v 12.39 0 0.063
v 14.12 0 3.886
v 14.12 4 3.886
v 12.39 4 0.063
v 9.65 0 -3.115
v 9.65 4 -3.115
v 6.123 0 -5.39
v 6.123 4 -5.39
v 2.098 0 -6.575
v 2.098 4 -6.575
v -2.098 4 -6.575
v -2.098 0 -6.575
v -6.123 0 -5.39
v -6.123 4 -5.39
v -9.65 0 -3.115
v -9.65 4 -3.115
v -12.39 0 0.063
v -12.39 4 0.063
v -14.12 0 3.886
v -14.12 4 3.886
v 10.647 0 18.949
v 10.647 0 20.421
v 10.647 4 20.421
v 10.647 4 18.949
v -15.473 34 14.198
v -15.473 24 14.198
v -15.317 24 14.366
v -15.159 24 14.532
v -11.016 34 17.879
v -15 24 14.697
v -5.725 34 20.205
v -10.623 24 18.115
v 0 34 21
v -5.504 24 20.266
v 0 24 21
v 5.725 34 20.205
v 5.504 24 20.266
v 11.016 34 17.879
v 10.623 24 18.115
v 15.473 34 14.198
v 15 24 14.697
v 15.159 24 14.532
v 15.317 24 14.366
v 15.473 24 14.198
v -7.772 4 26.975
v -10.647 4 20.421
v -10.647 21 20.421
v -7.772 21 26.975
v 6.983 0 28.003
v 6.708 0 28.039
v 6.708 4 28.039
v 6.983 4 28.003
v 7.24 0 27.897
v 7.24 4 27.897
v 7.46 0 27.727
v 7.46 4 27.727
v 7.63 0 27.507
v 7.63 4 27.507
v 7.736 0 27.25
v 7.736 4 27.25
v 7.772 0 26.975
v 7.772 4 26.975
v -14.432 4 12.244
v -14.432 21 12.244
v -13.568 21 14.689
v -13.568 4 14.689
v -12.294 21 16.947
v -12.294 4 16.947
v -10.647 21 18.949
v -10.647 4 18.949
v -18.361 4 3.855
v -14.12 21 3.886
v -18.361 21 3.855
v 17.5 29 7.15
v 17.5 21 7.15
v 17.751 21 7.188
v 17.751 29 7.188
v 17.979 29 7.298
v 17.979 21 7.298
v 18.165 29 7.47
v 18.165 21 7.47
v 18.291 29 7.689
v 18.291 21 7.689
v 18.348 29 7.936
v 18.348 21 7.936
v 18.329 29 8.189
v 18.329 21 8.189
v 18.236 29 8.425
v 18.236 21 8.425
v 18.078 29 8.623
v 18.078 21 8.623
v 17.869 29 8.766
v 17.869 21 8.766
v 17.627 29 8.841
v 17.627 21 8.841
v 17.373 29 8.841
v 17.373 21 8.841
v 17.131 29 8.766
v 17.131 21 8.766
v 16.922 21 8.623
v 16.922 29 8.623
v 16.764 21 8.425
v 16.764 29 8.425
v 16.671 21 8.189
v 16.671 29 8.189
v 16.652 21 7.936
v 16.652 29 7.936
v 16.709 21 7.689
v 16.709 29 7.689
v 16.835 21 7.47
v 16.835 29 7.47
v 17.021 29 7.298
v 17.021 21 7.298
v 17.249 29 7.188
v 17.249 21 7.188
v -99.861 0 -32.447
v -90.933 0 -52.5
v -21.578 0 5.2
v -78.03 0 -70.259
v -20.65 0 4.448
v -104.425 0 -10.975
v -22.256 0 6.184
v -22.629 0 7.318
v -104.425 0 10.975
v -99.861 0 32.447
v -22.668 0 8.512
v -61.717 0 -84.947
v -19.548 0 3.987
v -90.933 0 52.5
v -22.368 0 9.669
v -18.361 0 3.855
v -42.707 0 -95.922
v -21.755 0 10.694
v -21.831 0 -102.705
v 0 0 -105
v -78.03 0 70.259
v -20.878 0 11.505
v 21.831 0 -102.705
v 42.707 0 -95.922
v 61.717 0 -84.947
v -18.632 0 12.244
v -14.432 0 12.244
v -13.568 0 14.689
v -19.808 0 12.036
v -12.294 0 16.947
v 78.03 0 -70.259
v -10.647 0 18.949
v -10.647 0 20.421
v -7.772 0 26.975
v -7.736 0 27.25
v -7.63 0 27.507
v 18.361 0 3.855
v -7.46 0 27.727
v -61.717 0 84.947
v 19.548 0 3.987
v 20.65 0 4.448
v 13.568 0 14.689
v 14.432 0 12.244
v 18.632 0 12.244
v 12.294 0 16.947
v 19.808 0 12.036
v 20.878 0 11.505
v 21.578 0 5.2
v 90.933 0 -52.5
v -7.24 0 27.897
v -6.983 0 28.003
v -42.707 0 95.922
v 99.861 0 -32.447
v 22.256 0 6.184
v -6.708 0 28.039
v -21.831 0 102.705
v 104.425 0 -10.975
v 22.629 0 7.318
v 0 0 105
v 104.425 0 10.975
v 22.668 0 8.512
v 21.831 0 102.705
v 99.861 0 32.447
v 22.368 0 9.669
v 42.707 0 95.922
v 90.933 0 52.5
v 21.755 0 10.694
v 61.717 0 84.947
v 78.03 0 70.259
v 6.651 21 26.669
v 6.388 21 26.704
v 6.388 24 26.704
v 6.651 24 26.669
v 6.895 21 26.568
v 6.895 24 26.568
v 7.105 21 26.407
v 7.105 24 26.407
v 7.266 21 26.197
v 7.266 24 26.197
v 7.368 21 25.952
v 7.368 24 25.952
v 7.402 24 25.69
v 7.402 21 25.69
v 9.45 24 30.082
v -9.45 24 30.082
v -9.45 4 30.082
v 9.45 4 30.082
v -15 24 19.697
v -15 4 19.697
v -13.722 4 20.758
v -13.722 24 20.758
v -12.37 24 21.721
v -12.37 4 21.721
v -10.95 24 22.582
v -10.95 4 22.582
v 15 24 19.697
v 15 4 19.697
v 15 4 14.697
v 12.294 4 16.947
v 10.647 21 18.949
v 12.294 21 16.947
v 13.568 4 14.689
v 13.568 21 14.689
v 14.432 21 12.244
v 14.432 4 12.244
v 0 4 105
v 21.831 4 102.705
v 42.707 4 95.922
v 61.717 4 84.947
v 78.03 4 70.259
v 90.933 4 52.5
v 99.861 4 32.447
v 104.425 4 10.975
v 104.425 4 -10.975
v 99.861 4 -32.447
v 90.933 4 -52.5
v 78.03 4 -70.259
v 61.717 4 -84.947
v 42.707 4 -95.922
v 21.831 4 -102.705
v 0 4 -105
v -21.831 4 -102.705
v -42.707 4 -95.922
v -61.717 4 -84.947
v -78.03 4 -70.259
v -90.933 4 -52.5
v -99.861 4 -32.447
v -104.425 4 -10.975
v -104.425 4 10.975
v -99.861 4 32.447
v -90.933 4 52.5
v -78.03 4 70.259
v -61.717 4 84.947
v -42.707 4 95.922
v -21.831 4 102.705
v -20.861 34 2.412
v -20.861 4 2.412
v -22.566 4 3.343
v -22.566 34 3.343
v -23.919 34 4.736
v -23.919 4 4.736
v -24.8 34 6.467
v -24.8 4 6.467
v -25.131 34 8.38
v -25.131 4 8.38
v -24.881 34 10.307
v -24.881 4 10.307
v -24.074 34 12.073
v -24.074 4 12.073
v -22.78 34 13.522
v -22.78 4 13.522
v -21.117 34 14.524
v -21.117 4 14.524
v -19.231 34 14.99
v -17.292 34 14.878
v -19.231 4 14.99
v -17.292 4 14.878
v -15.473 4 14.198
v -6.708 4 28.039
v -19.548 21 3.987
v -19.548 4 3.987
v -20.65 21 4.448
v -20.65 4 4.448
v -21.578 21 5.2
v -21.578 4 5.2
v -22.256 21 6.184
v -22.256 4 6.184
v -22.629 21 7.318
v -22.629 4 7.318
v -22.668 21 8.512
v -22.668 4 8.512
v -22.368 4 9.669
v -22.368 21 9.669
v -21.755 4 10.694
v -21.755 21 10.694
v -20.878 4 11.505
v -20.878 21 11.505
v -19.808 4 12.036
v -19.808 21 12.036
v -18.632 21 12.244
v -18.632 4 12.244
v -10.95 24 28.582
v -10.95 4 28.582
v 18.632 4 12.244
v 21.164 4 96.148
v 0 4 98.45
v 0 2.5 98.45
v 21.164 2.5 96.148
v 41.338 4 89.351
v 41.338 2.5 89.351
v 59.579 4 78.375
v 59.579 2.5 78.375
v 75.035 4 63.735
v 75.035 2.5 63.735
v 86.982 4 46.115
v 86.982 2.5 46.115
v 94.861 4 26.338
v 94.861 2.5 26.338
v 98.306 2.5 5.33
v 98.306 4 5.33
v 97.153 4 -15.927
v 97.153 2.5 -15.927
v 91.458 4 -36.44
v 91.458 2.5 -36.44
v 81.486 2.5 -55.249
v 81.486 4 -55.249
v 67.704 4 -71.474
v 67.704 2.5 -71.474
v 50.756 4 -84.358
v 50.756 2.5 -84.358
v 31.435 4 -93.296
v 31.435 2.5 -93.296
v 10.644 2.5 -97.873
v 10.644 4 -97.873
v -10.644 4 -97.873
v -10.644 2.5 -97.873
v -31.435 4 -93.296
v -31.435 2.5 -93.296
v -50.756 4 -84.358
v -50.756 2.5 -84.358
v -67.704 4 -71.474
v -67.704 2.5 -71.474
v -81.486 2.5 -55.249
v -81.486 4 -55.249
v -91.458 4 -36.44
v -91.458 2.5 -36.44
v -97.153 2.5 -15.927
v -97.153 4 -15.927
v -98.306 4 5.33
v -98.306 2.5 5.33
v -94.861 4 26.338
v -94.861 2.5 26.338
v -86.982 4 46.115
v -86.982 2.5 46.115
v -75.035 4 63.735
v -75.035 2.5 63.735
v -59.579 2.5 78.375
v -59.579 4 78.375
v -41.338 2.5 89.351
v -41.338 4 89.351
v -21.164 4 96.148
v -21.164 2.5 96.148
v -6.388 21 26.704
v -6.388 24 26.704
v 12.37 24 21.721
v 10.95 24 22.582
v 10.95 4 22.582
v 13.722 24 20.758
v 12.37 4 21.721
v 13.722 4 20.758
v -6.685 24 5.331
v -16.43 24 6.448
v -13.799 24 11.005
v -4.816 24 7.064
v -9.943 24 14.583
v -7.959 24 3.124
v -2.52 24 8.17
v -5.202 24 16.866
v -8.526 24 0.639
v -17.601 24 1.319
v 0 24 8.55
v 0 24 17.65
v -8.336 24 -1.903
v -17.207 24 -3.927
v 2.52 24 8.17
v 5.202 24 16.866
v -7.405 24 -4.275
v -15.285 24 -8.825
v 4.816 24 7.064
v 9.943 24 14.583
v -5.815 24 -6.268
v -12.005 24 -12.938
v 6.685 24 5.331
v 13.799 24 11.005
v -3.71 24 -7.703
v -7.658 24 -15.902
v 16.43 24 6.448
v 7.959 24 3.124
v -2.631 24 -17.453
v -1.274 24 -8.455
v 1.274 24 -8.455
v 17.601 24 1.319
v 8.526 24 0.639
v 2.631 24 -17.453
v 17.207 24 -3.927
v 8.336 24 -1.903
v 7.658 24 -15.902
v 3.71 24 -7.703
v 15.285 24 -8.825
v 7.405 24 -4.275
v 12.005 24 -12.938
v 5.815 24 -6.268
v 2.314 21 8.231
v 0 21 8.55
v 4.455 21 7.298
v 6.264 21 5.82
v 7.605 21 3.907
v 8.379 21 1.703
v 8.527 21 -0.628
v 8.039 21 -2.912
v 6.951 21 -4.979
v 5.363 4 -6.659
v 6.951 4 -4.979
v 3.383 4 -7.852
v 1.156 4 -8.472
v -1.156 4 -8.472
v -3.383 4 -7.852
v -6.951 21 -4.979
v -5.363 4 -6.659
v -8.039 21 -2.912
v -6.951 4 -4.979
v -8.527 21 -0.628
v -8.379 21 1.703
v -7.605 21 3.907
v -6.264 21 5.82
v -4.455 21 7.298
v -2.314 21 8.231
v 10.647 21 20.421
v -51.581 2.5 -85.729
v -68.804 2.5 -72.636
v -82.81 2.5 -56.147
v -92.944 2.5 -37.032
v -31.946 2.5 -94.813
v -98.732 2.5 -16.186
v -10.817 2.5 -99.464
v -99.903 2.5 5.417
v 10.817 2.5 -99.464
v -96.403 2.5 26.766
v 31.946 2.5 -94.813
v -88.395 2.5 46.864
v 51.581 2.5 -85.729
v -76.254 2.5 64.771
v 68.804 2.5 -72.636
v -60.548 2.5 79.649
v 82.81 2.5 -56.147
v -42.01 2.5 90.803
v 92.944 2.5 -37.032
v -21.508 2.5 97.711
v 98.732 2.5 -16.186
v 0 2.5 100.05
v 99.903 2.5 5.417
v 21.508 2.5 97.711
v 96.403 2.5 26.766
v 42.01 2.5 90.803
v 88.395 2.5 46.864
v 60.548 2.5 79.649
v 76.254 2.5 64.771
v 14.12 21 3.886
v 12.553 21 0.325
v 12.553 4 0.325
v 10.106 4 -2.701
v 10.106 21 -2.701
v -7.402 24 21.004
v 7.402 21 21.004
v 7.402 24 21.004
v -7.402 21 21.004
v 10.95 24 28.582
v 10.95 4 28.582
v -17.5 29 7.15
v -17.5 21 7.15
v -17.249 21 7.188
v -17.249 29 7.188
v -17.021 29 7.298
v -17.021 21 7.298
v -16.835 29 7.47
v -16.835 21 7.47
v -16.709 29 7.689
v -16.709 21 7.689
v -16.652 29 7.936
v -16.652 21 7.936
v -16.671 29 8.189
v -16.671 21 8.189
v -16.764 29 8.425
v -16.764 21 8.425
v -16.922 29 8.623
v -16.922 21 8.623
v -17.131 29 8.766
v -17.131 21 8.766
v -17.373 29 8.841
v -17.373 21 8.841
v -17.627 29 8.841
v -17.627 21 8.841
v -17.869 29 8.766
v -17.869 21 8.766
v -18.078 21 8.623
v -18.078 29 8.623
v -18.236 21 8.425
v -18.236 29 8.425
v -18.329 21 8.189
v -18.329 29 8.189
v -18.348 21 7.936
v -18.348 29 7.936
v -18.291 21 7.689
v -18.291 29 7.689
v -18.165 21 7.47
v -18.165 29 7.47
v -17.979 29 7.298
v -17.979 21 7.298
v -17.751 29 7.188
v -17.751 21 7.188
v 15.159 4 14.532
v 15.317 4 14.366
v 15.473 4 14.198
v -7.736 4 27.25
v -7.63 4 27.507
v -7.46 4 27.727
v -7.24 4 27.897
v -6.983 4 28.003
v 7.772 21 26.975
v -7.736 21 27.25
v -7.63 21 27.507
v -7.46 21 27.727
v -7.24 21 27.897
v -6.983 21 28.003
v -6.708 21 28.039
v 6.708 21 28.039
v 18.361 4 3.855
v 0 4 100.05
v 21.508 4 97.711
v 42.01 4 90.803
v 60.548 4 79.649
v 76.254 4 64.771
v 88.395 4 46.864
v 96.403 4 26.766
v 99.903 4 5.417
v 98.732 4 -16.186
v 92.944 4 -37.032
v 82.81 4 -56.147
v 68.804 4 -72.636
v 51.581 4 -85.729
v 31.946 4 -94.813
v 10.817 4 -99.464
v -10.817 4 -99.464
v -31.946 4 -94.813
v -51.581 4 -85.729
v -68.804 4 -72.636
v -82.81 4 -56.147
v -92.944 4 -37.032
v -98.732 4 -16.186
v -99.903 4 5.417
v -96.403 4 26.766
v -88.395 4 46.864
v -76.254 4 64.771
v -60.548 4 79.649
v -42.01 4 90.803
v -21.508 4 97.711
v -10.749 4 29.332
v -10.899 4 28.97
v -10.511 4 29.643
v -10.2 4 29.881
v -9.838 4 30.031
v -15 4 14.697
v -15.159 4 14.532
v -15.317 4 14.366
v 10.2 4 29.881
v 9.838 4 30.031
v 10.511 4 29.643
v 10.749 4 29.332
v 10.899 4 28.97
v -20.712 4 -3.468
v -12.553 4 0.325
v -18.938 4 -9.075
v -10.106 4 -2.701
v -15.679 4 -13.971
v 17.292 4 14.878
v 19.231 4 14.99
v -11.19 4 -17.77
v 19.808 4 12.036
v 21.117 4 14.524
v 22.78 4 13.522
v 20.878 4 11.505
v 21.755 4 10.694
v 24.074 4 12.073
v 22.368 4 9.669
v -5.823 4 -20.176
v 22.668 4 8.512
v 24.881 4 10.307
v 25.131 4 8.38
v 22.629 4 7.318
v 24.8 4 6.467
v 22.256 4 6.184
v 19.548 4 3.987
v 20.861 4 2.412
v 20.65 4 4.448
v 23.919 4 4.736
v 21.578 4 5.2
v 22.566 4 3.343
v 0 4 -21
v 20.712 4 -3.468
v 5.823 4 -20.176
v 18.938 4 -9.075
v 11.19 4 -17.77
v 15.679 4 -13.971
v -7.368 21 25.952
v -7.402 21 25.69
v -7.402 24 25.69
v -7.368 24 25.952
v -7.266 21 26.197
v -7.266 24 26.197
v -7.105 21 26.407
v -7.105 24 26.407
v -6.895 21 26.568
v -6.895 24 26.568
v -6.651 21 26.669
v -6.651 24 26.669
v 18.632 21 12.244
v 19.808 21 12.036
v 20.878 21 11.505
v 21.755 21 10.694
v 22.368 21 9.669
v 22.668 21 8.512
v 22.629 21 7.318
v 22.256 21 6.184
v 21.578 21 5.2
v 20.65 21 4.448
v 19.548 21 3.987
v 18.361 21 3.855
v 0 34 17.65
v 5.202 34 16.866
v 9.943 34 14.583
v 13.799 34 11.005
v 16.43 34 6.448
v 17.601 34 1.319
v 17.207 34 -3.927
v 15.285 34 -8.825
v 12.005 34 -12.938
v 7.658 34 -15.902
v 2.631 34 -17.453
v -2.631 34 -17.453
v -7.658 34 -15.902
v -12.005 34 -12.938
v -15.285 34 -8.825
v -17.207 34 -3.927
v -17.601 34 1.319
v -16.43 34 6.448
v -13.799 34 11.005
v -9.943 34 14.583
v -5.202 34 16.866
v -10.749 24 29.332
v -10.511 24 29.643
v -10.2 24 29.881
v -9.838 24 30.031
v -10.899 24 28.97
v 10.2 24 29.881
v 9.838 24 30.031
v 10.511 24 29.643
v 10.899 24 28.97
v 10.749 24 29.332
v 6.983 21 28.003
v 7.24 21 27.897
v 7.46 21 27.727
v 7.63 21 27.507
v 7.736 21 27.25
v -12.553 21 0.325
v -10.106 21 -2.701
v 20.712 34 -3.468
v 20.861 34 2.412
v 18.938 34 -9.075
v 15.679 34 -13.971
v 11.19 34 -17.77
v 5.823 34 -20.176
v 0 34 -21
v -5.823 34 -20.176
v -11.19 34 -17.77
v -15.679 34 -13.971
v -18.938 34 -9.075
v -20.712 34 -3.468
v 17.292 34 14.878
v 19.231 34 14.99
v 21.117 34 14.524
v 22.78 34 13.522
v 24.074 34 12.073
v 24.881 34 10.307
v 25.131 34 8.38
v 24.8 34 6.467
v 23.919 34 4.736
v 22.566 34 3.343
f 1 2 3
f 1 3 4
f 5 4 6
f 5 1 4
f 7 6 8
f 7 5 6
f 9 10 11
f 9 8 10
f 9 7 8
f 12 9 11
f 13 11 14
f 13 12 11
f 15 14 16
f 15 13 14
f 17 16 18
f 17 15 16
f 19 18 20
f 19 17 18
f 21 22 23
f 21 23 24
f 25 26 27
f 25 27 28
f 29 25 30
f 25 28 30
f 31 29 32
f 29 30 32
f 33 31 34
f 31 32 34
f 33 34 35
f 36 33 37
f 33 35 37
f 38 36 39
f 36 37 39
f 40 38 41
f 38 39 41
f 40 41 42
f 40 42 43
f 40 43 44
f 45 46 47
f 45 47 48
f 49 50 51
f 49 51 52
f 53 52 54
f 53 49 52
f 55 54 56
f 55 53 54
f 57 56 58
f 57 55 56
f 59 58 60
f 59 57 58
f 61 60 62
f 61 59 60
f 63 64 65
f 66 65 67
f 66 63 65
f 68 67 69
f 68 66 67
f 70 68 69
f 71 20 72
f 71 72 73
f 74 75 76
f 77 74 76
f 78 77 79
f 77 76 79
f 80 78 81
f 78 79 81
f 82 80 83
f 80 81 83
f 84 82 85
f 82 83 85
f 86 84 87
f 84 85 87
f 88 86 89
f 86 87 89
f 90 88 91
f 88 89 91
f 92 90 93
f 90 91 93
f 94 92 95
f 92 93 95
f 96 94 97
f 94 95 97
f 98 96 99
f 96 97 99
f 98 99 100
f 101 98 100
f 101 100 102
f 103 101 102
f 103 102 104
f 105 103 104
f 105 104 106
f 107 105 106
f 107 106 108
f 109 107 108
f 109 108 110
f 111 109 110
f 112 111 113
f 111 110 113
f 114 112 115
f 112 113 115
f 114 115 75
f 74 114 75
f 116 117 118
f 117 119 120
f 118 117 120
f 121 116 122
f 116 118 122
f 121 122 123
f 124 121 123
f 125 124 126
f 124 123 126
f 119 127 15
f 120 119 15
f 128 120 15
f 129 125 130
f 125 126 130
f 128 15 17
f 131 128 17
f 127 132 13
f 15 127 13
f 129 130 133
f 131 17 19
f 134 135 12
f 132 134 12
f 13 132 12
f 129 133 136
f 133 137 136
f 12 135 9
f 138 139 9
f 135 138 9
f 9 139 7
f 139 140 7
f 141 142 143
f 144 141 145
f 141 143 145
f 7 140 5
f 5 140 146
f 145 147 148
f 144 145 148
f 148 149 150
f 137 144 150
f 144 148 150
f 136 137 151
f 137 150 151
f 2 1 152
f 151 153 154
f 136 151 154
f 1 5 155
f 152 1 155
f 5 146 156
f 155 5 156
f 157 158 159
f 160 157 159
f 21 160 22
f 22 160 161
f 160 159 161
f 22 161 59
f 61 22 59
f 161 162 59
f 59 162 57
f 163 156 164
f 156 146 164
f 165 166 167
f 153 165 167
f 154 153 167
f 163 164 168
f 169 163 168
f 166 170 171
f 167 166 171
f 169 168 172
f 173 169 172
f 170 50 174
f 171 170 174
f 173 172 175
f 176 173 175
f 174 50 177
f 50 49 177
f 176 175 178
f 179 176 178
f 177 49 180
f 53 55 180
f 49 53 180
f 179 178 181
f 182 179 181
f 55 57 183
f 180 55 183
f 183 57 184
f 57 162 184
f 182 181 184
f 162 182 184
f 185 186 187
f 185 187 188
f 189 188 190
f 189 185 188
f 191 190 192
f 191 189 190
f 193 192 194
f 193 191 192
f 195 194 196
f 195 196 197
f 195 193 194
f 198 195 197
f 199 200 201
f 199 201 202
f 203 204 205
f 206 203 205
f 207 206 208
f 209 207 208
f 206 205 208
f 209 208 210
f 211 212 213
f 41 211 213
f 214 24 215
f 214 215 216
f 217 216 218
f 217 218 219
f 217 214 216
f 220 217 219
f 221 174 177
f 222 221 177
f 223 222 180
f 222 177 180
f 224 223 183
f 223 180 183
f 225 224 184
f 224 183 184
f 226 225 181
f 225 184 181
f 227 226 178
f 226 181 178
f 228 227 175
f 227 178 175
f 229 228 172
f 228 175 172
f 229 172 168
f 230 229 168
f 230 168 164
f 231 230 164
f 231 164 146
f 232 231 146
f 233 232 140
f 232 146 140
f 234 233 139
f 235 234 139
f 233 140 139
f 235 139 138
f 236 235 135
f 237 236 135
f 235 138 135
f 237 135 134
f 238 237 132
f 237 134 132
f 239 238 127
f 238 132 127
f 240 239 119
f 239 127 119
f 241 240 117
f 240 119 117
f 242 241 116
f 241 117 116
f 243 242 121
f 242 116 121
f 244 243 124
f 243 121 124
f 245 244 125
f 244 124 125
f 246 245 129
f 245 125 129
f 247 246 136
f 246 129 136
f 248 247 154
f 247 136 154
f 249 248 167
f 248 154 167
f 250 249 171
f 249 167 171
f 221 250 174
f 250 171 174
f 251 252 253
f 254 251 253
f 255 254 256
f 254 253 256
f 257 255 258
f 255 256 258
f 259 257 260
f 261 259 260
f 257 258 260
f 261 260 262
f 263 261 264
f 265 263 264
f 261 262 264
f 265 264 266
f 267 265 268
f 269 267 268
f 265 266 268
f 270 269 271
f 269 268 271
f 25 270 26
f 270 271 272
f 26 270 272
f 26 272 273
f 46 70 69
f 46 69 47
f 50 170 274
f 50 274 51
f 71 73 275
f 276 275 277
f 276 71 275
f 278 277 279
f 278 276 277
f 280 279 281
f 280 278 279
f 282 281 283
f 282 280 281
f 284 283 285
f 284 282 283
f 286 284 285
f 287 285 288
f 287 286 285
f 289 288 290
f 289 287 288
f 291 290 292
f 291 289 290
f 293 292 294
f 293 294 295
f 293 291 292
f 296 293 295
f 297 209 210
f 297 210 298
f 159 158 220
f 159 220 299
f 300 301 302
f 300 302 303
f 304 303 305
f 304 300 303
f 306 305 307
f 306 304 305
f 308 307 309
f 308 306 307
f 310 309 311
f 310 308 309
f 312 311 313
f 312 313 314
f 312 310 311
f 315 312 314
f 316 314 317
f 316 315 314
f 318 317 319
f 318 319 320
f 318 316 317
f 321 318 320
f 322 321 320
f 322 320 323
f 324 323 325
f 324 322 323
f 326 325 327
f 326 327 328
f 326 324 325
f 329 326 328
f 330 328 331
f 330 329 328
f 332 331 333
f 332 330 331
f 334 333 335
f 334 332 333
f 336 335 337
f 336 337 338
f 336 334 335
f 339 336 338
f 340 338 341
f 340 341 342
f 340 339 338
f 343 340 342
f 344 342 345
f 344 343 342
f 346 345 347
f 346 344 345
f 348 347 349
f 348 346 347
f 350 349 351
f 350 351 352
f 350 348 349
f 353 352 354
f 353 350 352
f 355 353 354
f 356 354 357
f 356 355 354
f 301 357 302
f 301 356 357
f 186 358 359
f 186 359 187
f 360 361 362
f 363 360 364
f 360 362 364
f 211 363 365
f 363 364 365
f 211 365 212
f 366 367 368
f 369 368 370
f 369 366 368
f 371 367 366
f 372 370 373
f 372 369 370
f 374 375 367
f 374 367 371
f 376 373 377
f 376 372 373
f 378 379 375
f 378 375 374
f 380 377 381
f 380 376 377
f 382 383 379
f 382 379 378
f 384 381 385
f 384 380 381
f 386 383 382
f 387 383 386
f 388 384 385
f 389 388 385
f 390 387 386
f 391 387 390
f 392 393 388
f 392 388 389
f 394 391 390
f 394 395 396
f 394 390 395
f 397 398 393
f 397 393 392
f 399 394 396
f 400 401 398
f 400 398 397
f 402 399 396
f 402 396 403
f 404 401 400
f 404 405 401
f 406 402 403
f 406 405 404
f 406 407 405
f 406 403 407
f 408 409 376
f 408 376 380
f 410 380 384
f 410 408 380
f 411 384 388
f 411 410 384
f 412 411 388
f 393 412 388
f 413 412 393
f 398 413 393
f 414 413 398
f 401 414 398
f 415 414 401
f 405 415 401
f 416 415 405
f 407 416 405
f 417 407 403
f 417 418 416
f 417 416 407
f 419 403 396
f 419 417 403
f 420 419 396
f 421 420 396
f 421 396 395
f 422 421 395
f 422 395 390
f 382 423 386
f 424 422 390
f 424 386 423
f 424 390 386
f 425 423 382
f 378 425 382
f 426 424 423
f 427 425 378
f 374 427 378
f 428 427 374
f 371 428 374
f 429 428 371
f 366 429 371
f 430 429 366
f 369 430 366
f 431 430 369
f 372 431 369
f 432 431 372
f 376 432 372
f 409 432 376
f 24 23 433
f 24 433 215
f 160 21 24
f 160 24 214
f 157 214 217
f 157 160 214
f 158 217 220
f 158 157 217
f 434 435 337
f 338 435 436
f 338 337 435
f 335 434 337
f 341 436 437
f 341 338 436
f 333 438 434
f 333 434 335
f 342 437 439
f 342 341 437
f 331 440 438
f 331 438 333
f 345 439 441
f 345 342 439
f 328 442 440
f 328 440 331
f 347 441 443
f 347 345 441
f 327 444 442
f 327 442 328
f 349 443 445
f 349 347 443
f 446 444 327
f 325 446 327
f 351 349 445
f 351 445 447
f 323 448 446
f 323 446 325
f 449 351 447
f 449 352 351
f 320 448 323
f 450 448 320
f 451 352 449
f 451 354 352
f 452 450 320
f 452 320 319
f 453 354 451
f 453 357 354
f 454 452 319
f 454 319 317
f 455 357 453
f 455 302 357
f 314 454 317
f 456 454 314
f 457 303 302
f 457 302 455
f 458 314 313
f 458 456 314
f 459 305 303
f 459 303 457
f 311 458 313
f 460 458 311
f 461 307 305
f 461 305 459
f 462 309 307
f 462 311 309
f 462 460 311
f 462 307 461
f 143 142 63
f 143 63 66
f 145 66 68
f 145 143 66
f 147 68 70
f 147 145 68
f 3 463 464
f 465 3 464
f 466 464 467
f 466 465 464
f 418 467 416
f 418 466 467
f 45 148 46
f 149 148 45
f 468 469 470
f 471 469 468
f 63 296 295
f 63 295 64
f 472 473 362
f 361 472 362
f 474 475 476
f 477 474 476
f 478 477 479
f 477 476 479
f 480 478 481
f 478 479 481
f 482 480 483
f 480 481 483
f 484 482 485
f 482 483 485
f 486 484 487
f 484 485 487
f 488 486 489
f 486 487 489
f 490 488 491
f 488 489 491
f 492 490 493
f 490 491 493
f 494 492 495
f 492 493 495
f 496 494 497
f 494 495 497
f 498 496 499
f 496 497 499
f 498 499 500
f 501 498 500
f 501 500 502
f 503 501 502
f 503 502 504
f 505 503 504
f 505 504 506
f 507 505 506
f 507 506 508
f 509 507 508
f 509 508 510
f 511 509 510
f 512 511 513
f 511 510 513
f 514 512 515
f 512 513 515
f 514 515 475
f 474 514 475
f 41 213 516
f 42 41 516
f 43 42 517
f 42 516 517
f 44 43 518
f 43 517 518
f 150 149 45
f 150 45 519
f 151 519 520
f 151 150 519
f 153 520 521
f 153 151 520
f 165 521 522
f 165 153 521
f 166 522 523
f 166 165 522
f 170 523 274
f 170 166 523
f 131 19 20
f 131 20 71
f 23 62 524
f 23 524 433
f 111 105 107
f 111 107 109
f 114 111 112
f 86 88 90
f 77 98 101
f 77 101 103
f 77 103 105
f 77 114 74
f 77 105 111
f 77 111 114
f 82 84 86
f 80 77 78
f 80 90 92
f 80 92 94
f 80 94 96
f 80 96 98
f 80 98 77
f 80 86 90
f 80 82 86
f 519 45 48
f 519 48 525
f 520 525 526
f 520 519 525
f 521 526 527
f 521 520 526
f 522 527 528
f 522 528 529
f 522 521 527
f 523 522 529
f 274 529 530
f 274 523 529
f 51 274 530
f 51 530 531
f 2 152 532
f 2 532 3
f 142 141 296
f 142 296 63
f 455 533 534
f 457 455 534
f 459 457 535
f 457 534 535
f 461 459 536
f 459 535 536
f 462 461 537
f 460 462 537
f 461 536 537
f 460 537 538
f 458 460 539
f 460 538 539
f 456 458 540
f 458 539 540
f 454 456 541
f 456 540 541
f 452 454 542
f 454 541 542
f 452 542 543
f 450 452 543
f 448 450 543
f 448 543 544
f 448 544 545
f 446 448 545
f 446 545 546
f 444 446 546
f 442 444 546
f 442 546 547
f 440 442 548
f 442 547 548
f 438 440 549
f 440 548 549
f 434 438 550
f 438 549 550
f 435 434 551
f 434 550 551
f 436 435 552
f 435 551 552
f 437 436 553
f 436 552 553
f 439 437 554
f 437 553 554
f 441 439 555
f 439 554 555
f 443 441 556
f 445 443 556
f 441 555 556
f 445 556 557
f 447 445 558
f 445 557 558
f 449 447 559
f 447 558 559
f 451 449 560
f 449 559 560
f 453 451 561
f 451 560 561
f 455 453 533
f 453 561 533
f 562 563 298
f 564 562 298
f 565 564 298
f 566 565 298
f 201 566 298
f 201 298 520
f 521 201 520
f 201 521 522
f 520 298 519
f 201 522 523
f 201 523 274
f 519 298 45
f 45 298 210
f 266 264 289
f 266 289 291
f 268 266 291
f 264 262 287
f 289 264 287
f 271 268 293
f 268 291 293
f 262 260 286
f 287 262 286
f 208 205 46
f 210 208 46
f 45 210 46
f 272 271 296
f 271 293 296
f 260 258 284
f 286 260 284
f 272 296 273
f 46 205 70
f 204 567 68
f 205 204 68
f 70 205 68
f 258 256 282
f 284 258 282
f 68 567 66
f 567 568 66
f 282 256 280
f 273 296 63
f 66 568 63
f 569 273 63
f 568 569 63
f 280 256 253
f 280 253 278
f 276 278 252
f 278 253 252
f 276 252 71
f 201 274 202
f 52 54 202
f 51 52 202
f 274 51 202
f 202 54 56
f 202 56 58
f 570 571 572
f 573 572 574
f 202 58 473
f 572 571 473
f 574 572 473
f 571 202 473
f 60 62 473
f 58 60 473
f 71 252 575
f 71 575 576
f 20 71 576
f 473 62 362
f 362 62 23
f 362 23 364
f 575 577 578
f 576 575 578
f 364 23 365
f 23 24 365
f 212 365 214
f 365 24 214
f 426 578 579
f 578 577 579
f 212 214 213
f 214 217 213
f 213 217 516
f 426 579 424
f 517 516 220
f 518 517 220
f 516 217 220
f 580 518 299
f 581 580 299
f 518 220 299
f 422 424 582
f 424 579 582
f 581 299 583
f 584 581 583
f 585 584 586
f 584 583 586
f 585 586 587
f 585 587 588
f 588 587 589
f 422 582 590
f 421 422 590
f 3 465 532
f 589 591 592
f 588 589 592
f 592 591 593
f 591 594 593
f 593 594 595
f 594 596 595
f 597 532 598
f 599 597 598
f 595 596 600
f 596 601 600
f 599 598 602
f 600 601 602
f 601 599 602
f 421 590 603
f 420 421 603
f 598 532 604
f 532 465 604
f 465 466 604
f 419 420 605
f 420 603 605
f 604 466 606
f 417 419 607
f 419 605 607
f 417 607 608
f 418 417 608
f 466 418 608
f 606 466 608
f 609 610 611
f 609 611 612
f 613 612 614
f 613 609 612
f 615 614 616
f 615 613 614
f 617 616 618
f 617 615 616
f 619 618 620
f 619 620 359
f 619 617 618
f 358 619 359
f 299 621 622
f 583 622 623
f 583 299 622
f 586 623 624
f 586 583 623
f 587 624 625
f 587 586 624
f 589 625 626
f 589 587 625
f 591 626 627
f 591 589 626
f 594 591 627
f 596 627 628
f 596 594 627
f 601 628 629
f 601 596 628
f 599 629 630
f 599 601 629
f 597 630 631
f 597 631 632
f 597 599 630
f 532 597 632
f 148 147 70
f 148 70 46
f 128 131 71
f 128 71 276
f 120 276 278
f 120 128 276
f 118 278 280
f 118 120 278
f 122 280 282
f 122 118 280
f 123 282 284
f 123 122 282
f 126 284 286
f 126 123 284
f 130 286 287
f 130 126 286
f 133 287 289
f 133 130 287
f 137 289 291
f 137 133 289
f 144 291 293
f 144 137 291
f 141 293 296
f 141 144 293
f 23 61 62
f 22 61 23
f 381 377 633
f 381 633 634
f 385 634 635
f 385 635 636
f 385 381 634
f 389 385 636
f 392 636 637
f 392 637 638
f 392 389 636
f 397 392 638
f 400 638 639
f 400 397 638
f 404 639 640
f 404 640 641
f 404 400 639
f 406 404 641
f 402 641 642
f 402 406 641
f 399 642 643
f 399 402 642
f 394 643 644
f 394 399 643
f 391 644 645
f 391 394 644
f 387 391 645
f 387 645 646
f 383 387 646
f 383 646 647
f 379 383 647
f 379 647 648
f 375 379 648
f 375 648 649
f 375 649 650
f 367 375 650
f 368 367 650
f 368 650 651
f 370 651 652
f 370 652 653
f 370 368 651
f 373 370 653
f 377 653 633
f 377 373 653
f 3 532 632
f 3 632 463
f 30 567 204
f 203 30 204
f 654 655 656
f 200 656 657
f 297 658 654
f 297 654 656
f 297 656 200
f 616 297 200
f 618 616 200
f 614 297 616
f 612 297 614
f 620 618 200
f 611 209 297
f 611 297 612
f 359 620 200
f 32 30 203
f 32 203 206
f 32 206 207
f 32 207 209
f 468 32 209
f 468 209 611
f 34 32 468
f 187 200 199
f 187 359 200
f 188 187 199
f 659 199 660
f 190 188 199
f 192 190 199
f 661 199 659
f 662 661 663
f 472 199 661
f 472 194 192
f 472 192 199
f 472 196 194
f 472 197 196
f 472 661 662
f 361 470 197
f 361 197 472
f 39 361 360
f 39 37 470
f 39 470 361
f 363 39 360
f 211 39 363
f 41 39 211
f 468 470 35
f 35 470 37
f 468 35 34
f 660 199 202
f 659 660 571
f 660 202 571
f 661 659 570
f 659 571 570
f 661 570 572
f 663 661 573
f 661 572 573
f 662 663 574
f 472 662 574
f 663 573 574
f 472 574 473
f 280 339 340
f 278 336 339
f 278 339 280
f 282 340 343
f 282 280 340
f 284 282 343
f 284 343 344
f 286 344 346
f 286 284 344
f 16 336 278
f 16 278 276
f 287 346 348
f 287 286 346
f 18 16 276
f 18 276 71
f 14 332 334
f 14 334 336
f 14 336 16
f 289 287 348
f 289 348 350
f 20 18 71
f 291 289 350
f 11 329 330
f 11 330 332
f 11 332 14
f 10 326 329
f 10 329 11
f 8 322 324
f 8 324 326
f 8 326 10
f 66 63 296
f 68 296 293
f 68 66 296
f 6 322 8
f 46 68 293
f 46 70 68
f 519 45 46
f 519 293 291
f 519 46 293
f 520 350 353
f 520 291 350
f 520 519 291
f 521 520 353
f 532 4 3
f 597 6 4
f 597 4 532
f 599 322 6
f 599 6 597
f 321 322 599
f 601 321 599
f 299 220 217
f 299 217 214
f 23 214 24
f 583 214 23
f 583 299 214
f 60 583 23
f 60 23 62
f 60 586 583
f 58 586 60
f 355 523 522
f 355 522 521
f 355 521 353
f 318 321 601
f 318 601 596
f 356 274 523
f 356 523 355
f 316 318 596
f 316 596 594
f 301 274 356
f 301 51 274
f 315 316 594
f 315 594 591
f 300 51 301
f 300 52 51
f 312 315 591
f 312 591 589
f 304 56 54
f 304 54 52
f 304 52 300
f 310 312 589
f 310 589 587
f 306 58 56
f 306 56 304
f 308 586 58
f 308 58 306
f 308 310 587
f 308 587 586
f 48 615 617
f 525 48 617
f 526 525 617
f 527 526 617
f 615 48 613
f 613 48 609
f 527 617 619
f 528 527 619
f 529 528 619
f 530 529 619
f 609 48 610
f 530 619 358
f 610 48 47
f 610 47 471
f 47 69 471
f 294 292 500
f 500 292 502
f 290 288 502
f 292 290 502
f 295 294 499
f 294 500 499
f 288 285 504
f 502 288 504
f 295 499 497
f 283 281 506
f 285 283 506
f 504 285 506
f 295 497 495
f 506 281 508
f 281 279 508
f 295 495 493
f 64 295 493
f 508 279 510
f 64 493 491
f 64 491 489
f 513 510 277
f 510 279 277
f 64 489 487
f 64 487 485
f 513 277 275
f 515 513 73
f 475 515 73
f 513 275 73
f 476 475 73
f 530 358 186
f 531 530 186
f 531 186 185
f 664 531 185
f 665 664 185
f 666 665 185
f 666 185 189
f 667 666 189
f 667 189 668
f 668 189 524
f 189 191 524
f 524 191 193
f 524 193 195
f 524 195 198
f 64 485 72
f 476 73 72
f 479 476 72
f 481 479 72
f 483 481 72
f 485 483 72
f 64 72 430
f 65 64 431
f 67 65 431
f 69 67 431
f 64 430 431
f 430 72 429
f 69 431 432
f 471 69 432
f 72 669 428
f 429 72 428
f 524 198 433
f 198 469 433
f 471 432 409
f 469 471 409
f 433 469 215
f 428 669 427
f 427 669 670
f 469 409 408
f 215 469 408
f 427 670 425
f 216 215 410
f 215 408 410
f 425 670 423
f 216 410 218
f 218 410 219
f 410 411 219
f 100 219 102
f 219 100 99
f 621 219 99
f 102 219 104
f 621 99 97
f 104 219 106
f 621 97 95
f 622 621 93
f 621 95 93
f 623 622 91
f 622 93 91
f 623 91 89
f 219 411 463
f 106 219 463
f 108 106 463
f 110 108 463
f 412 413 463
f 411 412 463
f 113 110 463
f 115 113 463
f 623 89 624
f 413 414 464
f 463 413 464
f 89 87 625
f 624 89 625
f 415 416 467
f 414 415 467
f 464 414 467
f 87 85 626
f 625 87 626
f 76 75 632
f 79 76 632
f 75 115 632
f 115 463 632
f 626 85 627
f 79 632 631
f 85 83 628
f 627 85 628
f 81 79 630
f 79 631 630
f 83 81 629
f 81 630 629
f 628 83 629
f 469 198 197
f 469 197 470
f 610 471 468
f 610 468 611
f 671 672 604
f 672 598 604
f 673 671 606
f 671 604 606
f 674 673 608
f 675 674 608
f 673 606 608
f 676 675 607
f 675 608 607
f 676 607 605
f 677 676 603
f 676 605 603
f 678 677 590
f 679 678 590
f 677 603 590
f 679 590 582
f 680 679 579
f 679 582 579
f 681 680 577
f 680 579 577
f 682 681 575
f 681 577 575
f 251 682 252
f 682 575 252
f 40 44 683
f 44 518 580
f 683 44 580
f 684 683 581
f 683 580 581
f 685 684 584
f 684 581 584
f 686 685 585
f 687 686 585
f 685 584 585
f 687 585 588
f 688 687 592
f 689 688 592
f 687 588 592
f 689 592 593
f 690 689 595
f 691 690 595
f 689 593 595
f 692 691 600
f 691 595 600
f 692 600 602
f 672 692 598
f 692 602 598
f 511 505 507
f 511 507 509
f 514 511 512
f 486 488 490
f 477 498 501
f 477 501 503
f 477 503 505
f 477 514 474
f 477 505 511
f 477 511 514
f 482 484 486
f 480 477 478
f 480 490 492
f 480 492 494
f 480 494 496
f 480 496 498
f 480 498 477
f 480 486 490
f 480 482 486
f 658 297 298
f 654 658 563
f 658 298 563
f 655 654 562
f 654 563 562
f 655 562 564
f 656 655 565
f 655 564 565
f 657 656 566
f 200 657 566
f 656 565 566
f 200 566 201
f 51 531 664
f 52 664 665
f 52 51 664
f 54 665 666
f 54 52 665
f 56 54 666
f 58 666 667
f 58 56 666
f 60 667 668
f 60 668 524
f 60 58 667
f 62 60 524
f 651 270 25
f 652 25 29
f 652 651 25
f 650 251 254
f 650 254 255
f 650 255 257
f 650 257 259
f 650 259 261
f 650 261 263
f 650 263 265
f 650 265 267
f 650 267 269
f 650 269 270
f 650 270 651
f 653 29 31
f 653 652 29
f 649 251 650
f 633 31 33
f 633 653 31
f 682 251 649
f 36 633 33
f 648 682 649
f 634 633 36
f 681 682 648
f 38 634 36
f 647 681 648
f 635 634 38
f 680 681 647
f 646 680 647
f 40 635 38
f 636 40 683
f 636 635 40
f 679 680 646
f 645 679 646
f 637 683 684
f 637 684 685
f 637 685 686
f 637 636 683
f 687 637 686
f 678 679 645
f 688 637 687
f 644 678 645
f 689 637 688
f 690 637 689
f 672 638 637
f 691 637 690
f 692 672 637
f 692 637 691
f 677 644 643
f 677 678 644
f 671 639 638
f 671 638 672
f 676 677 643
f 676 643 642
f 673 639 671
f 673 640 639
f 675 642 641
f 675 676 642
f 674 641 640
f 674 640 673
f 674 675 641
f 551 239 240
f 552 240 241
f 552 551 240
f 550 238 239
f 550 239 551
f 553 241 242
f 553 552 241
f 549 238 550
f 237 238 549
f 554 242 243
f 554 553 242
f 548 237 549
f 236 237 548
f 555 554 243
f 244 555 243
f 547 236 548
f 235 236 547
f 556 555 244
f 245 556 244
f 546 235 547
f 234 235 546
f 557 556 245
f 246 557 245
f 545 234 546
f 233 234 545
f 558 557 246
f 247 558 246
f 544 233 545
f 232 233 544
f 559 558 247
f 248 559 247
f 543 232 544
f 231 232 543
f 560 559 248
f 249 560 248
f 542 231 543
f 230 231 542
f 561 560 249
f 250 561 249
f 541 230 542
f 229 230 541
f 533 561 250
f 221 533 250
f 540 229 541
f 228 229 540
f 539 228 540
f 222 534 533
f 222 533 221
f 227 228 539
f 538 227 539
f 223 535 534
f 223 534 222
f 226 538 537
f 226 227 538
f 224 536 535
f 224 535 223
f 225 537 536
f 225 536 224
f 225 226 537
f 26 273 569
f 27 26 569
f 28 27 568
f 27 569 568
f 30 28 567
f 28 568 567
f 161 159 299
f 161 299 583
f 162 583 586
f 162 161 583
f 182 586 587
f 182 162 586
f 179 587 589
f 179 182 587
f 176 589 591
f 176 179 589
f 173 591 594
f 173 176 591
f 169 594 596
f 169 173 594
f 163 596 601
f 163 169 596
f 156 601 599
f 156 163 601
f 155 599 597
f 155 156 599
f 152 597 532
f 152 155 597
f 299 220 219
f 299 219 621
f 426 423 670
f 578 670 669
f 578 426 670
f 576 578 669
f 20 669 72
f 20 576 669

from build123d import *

# Parameters (mm, degrees)
SKETCH1_R               = 105
BOSS_EXTRUDE1_DEPTH     = 4
SKETCH4_R               = 8.55
BOSS_EXTRUDE3_DEPTH     = 20
SKETCH5_R               = 17.65
BOSS_EXTRUDE4_DEPTH     = 10
CUT_EXTRUDE2_DEPTH      = 17
CUT_EXTRUDE2_DEPTH_BACK = 152.492574075
SKETCH14_R              = 100.05
SKETCH14_R_2            = 98.45
CUT_EXTRUDE3_DEPTH      = 1.5
SKETCH15_R              = 0.85
CUT_EXTRUDE4_DEPTH      = 8


with BuildPart() as part:
    # Sketch1 → Boss-Extrude1 (new body)
    with BuildSketch(Plane(origin=(0, 0, 0), x_dir=(1, 0, 0), z_dir=(0, 1, 0))):
        with Locations(Location((0, 0, 0), (0, 0, 270))):
            Circle(SKETCH1_R)
    extrude(amount=BOSS_EXTRUDE1_DEPTH)


with BuildPart() as body_2:
    # Sketch4 → Boss-Extrude3 (new body)
    with BuildSketch(Plane(origin=(0, 4, 0), x_dir=(1, 0, 0), z_dir=(0, 1, 0))):
        with BuildLine():
            Line((15, -19.696938457), (15, -14.696938457))
            ThreePointArc((15, -14.696938457), (15.238514929, -14.449486592), (15.472948223, -14.198164434))
            ThreePointArc((15.472948223, -14.198164434), (24.543834091, -11.220038442), (20.861060766, -2.411668247))
            ThreePointArc((20.861060766, -2.411668247), (0, 21), (-20.861060766, -2.411668247))
            ThreePointArc((-20.861060766, -2.411668247), (-24.543834091, -11.220038442), (-15.472948223, -14.198164434))
            ThreePointArc((-15.472948223, -14.198164434), (-15.238514929, -14.449486592), (-15, -14.696938457))
            Line((-15, -14.696938457), (-15, -19.696938457))
            ThreePointArc((-15, -19.696938457), (-13.054950812, -21.25177335), (-10.95, -22.582152982))
            Line((-10.95, -22.582152982), (-10.95, -28.582152982))
            ThreePointArc((-10.95, -28.582152982), (-10.510660172, -29.642813154), (-9.45, -30.082152982))
            Line((-9.45, -30.082152982), (9.45, -30.082152982))
            ThreePointArc((9.45, -30.082152982), (10.510660172, -29.642813154), (10.95, -28.582152982))
            Line((10.95, -28.582152982), (10.95, -22.582152982))
            ThreePointArc((10.95, -22.582152982), (13.054950812, -21.25177335), (15, -19.696938457))
        make_face()
        with Locations(Location((0, 0, 0), (0, 0, 270))):
            Circle(SKETCH4_R, mode=Mode.SUBTRACT)
        with BuildLine():
            Line((7.4022, -25.690036345), (7.4022, -21.004036345))
            Line((7.4022, -21.004036345), (-7.4022, -21.004036345))
            Line((-7.4022, -21.004036345), (-7.4022, -25.690036345))
            ThreePointArc((-7.4022, -25.690036345), (-7.105206276, -26.407042621), (-6.3882, -26.704036345))
            Line((-6.3882, -26.704036345), (6.3882, -26.704036345))
            ThreePointArc((6.3882, -26.704036345), (7.105206276, -26.407042621), (7.4022, -25.690036345))
        make_face(mode=Mode.SUBTRACT)
    extrude(amount=BOSS_EXTRUDE3_DEPTH)

    # Sketch5 → Boss-Extrude4 (add)
    with BuildSketch(Plane(origin=(0, 24, 0), x_dir=(1, 0, 0), z_dir=(0, 1, 0))):
        with BuildLine():
            ThreePointArc((-15.472948223, -14.198164434), (0, -21), (15.472948223, -14.198164434))
            ThreePointArc((15.472948223, -14.198164434), (24.543834091, -11.220038442), (20.861060766, -2.411668247))
            ThreePointArc((20.861060766, -2.411668247), (0, 21), (-20.861060766, -2.411668247))
            ThreePointArc((-20.861060766, -2.411668247), (-24.543834091, -11.220038442), (-15.472948223, -14.198164434))
        make_face()
        with Locations(Location((0, 0, 0), (0, 0, 270))):
            Circle(SKETCH5_R, mode=Mode.SUBTRACT)
    extrude(amount=BOSS_EXTRUDE4_DEPTH)


with BuildPart() as cut_extrude2_tool:
    # Sketch2 → Cut-Extrude2 (new, two sides: drawn at the far end of the back side and taken through both)
    with BuildSketch(Plane(origin=(0, 4, 0), x_dir=(1, 0, 0), z_dir=(0, 1, 0)).offset(-CUT_EXTRUDE2_DEPTH_BACK)):
        with BuildLine():
            Line((10.647, -20.421307878), (10.647, -18.949486917))
            ThreePointArc((10.647, -18.949486917), (12.980207439, -15.845429725), (14.43247879, -12.24405))
            Line((14.43247879, -12.24405), (18.63225, -12.24405))
            ThreePointArc((18.63225, -12.24405), (22.691207439, -7.913921777), (18.361079216, -3.854964338))
            Line((18.361079216, -3.854964338), (14.120149763, -3.886165663))
            ThreePointArc((14.120149763, -3.886165663), (0, 6.72588), (-14.120149763, -3.886165663))
            Line((-14.120149763, -3.886165663), (-18.361079216, -3.854964338))
            ThreePointArc((-18.361079216, -3.854964338), (-22.691207439, -7.913921777), (-18.63225, -12.24405))
            Line((-18.63225, -12.24405), (-14.43247879, -12.24405))
            ThreePointArc((-14.43247879, -12.24405), (-12.980207439, -15.845429725), (-10.647, -18.949486917))
            Line((-10.647, -18.949486917), (-10.647, -20.421307878))
            Line((-10.647, -20.421307878), (-7.77231, -26.974538162))
            ThreePointArc((-7.77231, -26.974538162), (-7.46046659, -27.727394752), (-6.70761, -28.039238162))
            Line((-6.70761, -28.039238162), (6.70761, -28.039238162))
            ThreePointArc((6.70761, -28.039238162), (7.46046659, -27.727394752), (7.77231, -26.974538162))
            Line((7.77231, -26.974538162), (10.647, -20.421307878))
        make_face()
    extrude(amount=CUT_EXTRUDE2_DEPTH + CUT_EXTRUDE2_DEPTH_BACK)


with BuildPart() as part_1:
    add(part.part)

    # Cut-Extrude2: cut by cut_extrude2_tool
    add(cut_extrude2_tool.part, mode=Mode.SUBTRACT)

    # Sketch14 → Cut-Extrude3 (cut)
    with BuildSketch(Plane(origin=(0, 4, 0), x_dir=(1, 0, 0), z_dir=(0, 1, 0))):
        with Locations(Location((0, 0, 0), (0, 0, 270))):
            Circle(SKETCH14_R)
        with Locations(Location((0, 0, 0), (0, 0, 270))):
            Circle(SKETCH14_R_2, mode=Mode.SUBTRACT)
    extrude(amount=-CUT_EXTRUDE3_DEPTH, mode=Mode.SUBTRACT)


with BuildPart() as body_2_1:
    add(body_2.part)

    # Cut-Extrude2: cut by cut_extrude2_tool
    add(cut_extrude2_tool.part, mode=Mode.SUBTRACT)

    # Sketch15 → Cut-Extrude4 (cut)
    with BuildSketch(Plane.XZ.offset(-21)):
        with Locations(Location((-17.5, 8, 0), (0, 0, 270))):
            Circle(SKETCH15_R)
        with Locations(Location((17.5, 8, 0), (0, 0, 270))):
            Circle(SKETCH15_R)
    extrude(amount=-CUT_EXTRUDE4_DEPTH, mode=Mode.SUBTRACT)


solid = Compound([part_1.part, body_2_1.part])
